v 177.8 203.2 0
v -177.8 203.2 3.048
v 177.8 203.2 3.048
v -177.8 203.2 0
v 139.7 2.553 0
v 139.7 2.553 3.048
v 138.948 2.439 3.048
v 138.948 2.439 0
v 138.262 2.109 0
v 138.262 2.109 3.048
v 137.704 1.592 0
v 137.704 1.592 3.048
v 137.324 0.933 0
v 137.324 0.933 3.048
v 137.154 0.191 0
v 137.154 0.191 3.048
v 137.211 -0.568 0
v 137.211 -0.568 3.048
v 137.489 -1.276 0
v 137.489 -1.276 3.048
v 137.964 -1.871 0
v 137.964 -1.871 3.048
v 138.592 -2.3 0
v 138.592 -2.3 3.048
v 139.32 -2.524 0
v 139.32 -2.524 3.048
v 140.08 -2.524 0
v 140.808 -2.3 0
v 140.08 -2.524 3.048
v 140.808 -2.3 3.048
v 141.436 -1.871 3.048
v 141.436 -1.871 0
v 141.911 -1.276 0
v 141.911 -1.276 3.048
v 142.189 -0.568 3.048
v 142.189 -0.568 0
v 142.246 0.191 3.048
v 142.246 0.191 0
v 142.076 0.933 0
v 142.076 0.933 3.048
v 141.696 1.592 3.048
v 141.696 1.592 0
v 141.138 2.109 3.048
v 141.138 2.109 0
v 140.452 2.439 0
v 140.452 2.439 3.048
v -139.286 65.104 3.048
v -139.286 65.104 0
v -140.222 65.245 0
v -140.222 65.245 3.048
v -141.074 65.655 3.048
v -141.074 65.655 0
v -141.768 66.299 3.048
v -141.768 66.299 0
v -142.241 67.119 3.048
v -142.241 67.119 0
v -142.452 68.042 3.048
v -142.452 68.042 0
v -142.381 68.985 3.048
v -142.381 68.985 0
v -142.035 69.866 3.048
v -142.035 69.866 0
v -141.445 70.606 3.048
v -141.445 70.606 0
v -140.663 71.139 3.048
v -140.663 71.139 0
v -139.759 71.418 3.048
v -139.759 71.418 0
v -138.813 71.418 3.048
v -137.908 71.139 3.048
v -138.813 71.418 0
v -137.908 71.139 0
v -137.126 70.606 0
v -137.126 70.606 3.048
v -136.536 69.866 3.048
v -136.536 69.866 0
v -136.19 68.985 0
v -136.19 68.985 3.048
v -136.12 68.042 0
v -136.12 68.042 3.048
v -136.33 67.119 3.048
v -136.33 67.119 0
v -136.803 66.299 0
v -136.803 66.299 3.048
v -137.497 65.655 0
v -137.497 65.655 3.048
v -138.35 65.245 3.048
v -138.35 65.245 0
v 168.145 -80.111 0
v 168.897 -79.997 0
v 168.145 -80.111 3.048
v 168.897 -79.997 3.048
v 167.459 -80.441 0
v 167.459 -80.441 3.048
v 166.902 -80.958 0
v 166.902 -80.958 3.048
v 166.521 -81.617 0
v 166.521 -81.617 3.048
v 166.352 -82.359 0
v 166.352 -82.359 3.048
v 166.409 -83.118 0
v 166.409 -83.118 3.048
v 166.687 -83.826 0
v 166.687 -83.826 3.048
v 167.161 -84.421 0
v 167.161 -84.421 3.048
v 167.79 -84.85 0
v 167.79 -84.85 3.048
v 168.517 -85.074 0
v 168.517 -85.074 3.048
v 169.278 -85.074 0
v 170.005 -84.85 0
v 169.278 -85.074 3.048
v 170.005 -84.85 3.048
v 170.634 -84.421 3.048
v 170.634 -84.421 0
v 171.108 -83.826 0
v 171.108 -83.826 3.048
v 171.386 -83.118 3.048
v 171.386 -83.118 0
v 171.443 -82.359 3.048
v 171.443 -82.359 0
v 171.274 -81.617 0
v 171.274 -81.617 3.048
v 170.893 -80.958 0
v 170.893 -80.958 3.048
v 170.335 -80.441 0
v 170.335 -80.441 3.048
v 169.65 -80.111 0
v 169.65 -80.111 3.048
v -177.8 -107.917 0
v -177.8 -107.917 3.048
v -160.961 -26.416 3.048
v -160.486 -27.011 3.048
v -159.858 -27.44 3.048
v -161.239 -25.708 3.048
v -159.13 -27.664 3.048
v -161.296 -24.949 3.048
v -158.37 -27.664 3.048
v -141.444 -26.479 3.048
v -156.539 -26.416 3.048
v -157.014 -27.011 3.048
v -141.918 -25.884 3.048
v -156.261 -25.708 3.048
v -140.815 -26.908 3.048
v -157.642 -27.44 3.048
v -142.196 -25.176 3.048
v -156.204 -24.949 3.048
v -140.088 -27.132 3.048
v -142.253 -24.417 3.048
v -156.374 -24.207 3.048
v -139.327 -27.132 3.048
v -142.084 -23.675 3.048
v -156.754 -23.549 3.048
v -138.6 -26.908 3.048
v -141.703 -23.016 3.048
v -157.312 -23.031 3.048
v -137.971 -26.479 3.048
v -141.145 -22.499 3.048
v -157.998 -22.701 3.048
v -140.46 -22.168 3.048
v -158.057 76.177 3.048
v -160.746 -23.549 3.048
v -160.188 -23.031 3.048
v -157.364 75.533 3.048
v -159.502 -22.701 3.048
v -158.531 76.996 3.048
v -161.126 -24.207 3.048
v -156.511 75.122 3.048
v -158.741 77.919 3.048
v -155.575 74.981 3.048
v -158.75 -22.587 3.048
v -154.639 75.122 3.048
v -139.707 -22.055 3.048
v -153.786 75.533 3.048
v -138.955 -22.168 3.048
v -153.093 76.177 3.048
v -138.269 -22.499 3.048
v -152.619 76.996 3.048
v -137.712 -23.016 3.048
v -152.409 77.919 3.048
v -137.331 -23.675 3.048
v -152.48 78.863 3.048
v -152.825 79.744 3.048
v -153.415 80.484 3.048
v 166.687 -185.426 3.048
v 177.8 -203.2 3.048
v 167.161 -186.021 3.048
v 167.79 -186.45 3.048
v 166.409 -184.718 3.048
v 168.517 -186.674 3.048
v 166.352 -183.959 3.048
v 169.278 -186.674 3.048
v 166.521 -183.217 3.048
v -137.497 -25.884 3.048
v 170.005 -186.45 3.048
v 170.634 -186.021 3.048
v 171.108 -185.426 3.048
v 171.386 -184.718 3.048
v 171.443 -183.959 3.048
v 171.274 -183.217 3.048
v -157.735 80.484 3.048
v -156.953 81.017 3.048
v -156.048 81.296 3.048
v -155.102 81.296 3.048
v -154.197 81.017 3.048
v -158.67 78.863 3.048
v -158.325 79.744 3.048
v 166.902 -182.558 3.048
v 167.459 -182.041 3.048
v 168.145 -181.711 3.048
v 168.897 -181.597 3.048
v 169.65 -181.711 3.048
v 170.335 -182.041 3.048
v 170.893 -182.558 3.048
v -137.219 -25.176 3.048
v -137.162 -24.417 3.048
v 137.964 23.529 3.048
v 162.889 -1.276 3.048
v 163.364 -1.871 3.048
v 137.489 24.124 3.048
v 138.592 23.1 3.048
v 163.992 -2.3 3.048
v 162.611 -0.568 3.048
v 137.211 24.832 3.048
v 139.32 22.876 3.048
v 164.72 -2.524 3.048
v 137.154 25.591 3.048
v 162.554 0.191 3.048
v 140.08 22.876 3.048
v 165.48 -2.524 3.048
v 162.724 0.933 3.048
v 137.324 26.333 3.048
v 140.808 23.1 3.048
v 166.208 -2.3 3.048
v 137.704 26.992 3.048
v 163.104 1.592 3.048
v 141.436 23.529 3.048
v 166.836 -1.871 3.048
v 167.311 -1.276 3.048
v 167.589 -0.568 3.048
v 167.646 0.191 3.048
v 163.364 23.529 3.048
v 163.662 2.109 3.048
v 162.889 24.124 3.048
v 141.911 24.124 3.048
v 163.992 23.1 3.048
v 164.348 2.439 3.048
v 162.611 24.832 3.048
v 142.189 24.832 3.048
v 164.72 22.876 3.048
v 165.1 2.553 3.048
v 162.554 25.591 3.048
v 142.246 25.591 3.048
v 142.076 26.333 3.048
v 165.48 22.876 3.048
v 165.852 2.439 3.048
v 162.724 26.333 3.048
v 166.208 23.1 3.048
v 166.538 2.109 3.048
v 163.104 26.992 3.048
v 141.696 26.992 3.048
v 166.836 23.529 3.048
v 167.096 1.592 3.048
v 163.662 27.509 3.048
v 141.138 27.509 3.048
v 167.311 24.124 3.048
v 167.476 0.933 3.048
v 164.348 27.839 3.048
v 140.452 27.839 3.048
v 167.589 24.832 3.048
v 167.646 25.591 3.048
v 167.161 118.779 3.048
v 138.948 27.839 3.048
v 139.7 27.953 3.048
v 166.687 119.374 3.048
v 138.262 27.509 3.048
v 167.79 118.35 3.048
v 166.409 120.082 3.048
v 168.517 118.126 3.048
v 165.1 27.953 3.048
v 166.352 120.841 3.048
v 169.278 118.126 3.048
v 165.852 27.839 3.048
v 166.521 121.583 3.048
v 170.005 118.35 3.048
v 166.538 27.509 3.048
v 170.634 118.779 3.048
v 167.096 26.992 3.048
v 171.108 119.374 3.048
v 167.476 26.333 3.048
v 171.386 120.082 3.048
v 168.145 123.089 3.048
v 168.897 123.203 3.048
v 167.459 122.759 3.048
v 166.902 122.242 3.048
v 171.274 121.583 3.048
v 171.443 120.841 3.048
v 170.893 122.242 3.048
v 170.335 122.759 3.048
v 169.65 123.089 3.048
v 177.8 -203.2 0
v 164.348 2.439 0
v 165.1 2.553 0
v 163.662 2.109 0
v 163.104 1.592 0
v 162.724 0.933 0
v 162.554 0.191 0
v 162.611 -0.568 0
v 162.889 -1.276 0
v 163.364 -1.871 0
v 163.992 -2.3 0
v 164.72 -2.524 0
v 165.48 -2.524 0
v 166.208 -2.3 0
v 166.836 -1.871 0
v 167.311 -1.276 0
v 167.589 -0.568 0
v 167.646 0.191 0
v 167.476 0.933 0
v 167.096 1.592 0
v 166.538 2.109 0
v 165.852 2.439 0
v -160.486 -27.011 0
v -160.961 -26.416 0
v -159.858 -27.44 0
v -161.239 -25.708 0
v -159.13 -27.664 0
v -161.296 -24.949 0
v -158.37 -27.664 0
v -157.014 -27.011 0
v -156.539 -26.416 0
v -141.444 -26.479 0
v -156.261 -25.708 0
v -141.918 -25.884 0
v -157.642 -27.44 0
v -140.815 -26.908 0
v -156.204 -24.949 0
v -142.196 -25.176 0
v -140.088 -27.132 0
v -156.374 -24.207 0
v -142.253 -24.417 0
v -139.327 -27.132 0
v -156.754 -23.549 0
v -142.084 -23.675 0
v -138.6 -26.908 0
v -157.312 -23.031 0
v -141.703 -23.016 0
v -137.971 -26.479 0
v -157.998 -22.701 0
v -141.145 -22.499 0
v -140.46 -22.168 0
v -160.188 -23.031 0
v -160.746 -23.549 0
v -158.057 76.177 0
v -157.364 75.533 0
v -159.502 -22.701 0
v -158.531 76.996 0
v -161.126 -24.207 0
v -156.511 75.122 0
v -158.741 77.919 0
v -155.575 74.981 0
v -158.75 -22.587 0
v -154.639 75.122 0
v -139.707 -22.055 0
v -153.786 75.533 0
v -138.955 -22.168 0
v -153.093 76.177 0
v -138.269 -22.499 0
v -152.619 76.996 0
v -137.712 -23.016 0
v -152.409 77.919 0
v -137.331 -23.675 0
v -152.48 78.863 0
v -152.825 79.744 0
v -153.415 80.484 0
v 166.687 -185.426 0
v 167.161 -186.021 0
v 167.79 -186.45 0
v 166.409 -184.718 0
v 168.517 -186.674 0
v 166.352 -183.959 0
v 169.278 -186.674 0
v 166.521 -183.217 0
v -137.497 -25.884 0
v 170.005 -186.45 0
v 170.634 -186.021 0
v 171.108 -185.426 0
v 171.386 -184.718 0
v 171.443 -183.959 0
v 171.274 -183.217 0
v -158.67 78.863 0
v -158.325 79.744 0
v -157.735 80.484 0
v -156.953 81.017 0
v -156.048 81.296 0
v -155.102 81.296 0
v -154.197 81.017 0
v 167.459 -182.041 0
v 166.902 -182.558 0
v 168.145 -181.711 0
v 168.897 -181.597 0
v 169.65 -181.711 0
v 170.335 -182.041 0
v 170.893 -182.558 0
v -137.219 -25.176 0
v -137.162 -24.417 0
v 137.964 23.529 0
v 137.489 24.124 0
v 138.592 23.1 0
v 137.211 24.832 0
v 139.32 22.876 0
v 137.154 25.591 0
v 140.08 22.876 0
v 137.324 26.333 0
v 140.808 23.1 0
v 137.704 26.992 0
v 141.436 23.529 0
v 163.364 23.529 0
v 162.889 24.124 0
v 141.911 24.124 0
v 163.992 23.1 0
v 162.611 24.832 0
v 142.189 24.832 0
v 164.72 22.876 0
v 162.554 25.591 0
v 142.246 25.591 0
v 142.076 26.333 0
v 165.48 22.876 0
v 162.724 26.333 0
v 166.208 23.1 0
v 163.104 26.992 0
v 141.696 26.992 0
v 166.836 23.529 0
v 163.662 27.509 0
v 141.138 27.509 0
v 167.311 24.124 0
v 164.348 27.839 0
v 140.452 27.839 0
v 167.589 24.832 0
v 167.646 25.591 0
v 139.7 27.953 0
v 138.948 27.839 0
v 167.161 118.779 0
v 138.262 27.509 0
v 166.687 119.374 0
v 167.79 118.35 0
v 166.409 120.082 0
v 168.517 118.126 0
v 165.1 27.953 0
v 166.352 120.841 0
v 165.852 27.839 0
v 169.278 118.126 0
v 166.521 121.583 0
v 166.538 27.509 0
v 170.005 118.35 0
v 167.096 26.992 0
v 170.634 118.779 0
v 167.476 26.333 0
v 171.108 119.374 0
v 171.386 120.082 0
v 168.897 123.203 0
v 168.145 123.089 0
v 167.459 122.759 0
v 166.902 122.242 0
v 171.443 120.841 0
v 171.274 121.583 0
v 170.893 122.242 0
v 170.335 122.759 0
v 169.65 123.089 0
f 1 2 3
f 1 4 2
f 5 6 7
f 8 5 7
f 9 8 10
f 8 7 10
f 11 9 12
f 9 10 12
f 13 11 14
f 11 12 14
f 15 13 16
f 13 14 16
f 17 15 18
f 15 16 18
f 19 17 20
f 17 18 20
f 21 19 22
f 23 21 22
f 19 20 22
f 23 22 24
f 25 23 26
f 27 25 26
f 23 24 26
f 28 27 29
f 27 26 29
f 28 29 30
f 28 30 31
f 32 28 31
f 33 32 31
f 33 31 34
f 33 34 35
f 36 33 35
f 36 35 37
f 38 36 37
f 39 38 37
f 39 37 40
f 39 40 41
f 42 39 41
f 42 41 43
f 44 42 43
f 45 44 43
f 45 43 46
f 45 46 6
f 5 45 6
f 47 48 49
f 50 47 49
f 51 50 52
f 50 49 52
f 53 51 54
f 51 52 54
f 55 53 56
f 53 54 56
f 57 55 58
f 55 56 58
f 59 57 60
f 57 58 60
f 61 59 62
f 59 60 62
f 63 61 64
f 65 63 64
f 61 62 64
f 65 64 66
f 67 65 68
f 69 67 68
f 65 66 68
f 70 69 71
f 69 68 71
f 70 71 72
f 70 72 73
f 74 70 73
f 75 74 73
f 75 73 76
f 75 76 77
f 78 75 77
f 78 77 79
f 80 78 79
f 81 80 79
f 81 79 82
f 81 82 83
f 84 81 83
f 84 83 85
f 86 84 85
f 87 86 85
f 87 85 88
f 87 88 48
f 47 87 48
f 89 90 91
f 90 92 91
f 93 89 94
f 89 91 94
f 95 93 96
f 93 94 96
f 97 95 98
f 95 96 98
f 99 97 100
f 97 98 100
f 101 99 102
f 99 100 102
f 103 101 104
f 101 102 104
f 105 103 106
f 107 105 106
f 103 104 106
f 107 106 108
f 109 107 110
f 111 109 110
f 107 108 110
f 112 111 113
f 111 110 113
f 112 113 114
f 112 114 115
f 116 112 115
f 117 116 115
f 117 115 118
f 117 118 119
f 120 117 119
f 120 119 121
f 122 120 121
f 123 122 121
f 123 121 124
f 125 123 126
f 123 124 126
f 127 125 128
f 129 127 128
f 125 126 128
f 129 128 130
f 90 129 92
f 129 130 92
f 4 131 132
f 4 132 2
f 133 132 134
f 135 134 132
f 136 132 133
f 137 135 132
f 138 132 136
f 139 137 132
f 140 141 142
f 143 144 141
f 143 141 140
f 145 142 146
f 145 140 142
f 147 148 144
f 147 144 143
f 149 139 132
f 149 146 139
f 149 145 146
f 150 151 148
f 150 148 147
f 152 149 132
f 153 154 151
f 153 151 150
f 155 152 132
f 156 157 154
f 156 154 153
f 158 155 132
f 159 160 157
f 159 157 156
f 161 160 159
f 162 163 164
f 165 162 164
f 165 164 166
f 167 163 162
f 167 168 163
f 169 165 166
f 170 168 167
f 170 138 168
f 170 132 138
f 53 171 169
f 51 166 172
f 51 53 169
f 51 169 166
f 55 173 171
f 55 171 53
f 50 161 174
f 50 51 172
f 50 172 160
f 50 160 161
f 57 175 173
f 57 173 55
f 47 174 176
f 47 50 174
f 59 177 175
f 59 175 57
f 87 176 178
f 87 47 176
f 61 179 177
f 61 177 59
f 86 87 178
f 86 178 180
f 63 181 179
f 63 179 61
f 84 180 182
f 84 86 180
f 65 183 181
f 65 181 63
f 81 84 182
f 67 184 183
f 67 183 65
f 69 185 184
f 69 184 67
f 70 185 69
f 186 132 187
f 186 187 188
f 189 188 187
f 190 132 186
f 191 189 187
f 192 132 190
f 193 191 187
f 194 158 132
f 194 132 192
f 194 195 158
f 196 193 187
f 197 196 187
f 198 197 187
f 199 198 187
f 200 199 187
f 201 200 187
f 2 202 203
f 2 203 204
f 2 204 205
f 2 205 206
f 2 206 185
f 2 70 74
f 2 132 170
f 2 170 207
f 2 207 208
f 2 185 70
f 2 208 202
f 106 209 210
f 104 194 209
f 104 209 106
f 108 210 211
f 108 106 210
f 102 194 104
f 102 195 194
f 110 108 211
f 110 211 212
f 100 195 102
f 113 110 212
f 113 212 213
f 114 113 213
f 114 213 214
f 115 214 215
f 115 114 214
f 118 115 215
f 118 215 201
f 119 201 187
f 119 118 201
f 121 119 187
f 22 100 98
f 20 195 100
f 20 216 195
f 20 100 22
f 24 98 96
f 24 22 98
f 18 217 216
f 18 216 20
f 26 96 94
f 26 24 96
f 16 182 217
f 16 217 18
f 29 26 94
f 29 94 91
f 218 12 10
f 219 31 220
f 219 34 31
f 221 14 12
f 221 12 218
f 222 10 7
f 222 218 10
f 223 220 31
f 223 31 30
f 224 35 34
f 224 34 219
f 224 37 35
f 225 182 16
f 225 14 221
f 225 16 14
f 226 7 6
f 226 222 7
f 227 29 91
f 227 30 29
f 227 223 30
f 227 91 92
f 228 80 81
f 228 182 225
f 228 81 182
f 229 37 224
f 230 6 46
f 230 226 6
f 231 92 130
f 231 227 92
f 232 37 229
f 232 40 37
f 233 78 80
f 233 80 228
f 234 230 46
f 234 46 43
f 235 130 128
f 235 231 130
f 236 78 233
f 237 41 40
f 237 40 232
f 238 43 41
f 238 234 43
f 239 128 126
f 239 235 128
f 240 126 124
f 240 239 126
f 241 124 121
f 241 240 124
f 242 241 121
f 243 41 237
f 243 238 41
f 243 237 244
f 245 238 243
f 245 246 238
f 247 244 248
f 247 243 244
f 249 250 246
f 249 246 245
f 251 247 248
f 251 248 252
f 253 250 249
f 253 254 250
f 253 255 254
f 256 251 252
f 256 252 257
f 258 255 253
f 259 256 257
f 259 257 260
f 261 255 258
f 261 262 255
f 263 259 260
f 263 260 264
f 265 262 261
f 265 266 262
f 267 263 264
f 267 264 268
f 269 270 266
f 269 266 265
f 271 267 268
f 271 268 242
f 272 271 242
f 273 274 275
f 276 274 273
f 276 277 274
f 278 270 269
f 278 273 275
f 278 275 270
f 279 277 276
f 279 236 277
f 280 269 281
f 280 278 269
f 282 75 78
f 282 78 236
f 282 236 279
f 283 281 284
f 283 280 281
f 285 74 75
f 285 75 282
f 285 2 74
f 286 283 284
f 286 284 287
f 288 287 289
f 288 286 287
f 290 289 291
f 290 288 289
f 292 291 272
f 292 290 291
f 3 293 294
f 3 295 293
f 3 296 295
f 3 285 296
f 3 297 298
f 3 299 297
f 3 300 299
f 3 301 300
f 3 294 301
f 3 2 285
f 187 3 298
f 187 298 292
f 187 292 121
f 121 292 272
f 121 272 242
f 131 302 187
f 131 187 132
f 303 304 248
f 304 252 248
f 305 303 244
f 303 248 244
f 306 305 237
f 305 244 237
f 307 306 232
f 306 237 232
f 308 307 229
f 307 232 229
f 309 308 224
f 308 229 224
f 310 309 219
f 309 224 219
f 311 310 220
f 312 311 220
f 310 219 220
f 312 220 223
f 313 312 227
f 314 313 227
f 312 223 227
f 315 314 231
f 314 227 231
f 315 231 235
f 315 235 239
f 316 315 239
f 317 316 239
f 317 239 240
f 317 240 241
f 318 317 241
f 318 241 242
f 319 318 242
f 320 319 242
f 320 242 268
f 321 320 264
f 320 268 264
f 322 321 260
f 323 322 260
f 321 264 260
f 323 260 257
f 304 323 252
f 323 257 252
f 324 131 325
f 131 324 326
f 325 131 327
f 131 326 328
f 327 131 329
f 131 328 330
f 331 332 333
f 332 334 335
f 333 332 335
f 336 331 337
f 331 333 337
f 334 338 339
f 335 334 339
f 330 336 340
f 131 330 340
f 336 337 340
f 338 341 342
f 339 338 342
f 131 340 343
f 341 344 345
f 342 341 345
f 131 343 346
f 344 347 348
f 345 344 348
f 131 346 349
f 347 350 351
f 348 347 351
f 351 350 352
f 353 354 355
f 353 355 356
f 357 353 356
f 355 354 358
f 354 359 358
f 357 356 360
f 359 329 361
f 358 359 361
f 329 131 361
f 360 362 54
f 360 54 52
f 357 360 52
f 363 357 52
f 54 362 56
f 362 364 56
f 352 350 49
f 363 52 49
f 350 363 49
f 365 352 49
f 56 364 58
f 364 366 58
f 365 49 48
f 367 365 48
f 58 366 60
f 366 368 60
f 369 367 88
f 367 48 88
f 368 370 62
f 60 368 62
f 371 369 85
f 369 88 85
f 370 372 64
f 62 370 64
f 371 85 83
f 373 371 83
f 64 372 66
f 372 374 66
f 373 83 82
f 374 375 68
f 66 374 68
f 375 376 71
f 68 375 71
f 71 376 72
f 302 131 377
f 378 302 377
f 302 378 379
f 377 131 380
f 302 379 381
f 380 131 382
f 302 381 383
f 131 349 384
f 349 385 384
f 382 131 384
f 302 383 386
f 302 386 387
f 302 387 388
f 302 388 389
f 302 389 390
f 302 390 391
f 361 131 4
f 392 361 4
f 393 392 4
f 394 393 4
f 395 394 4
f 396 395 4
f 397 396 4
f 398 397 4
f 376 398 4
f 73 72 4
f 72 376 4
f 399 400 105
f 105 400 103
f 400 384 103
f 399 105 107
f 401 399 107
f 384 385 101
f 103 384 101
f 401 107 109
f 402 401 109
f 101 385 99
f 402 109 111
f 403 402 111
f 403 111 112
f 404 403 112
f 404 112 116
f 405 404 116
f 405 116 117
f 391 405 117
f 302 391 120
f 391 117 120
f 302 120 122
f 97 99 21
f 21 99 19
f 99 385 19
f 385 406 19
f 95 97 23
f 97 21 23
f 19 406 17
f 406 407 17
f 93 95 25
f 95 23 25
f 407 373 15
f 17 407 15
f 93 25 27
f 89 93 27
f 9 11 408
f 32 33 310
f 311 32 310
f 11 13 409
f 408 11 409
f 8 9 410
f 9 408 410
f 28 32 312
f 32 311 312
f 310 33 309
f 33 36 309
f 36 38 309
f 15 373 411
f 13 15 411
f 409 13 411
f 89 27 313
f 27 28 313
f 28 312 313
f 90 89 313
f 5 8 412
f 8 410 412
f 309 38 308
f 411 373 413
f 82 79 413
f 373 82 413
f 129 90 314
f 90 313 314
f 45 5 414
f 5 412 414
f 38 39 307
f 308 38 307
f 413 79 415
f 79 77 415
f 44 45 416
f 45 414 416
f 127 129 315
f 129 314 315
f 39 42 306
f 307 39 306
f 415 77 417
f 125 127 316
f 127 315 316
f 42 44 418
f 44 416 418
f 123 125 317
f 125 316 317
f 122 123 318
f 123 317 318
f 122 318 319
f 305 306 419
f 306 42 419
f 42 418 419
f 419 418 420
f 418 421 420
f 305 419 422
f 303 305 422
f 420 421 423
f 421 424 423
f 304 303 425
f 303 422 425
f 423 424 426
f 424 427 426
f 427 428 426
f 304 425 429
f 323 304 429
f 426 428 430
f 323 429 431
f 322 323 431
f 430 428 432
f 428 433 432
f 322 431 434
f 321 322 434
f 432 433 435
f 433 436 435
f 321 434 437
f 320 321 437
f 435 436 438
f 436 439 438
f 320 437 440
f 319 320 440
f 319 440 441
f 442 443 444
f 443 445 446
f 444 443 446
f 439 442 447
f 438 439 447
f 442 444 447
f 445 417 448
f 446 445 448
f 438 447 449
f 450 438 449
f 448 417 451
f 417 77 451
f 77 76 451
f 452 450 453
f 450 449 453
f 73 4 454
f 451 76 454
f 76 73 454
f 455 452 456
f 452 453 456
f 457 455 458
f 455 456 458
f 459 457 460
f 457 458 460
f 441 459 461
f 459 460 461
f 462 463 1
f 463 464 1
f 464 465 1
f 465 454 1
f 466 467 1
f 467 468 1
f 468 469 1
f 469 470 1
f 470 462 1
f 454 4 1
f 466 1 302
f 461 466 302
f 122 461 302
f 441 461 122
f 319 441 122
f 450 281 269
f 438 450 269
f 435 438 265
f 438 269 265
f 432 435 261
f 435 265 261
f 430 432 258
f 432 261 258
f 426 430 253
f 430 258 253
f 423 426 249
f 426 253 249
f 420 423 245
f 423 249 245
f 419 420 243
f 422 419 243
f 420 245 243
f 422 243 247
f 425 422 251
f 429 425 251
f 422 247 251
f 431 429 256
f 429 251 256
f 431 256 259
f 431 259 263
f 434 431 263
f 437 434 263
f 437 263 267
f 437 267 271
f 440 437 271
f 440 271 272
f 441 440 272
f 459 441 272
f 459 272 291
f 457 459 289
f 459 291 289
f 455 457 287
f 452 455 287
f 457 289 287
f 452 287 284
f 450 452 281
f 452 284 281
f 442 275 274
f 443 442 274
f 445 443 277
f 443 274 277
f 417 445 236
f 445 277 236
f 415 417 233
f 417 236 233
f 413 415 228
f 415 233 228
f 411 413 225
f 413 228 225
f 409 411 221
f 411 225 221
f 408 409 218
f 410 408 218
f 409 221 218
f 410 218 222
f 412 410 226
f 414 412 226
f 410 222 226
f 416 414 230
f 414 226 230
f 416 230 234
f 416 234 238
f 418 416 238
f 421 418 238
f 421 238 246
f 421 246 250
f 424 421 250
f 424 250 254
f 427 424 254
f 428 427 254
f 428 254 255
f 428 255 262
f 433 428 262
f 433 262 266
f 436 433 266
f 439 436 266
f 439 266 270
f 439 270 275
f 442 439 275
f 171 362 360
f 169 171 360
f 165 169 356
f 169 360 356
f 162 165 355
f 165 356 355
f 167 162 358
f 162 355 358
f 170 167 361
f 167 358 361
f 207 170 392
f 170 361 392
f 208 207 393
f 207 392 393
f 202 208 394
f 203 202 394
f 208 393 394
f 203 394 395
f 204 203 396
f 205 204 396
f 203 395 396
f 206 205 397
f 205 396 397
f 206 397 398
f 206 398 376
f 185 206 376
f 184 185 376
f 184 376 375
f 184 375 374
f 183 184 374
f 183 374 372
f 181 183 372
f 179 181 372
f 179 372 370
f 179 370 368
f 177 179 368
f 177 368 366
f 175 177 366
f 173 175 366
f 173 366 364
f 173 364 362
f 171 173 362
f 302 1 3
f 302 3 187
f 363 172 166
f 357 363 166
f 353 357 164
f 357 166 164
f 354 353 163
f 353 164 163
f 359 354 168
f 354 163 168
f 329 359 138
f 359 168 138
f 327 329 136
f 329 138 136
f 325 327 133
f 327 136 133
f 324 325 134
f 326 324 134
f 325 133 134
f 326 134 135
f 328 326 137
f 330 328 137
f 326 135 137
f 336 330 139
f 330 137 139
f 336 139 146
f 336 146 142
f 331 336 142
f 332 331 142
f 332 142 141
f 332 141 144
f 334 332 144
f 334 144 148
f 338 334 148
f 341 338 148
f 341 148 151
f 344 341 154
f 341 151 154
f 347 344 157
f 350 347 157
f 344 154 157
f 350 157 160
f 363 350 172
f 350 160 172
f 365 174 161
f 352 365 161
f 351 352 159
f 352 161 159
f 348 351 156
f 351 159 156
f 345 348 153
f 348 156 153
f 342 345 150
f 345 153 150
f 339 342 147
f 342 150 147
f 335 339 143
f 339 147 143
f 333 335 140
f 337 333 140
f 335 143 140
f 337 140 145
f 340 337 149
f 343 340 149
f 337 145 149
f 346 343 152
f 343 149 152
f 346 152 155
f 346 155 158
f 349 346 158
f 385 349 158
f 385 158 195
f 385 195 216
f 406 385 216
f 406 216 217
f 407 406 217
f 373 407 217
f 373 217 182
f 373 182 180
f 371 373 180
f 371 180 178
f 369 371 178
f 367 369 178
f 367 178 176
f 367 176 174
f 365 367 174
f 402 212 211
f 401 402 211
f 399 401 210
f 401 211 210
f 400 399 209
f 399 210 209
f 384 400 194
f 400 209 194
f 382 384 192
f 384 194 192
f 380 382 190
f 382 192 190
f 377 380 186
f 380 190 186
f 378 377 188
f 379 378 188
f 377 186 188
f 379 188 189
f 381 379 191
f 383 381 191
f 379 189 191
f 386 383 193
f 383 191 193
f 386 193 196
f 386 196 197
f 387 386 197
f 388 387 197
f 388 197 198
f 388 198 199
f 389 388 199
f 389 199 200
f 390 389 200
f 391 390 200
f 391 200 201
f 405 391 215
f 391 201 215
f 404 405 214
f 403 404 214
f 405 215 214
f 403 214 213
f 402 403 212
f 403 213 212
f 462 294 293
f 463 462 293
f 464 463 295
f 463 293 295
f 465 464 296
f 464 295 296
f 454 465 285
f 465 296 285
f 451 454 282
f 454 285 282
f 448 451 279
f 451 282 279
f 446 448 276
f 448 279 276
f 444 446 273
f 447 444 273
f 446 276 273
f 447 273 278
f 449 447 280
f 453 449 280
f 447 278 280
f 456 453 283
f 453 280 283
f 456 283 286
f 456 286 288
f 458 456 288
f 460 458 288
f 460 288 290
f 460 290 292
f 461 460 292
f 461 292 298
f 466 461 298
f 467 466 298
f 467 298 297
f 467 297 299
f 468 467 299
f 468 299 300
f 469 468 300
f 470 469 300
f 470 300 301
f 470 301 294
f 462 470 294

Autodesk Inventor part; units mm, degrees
ref_plane "YZ Plane" through (0, 0, 0) normal (1, 0, 0) x (0, 1, 0)
ref_plane "XZ Plane" through (0, 0, 0) normal (0, 1, 0) x (-1, 0, 0)
ref_plane "XY Plane" through (0, 0, 0) normal (0, 0, 1) x (1, 0, 0)
sketch "Sketch1" plane through (0, 0, 0) normal (0, 0, 1) x (1, 0, 0)
  line L0 (-177.8, 203.2) -> (177.8, 203.2)
  line L1 (177.8, 203.2) -> (177.8, -203.2)
  line L2 (177.8, -203.2) -> (-177.8, -203.2)
  line L3 (-177.8, -203.2) -> (-177.8, 203.2)
  line L4 (-177.8, 203.2) -> (177.8, -203.2) construction
  line L5 (177.8, 203.2) -> (-177.8, -203.2) construction
  point P0 (0, 0)
  dimension "d0" = 355.6
  dimension "d1" = 406.4
extrude "Plate1" add sketch "Sketch1" along normal blind 3.048
sketch "Sketch2" plane through (0, 0, 0) normal (0, 0, -1) x (-1, 0, 0)
  line L0 (177.8, -203.2) -> (-177.8, -203.2) construction
  line L1 (177.8, 203.2) -> (177.8, -203.2) construction
  line L2 (-177.8, 203.2) -> (177.8, 203.2) construction
  line L3 (-177.8, -203.2) -> (-177.8, 203.2) construction
  line L4 (-177.8, -203.2) -> (177.8, -107.9173)
  line L5 (-177.8, -203.2) -> (190.3442, -203.2) construction
  line L6 (177.8, 203.2) -> (177.8, -203.2) construction
  line L7 (177.8, -107.9173) -> (177.8, -203.2)
  line L8 (177.8, -203.2) -> (-177.8, -203.2)
  point P0 (0, 0)
  dimension "d3" = 15
extrude "Cut1" cut sketch "Sketch2" against normal blind 3.048
sketch "Sketch3" plane through (0, 0, 0) normal (0, 0, -1) x (-1, 0, 0)
  line L0 (-177.8, -203.2) -> (177.8, -107.9173) construction
  line L1 (177.8, 203.2) -> (177.8, -107.9173) construction
  line L2 (-177.8, 203.2) -> (177.8, 203.2) construction
  line L3 (-177.8, -203.2) -> (-177.8, 203.2) construction
  line L4 (-177.8, 0) -> (-165.1, 0) construction
  point P0 (0, 0)
  point P1 (-139.7, 0)
  point P2 (-165.1, 25.4)
  point P3 (-139.7, 25.4)
  dimension "d6" = 12.7
  dimension "d9" = 25.4
  dimension "d12" = 25.4
hole "Hole1" at (165.1, 0, 0) at (139.7, 0, 0) at (165.1, 25.4, 0) at (139.7, 25.4, 0) direction (0, 0, 1) diameter 5.1054 end through all clearance for "Flat Head Machine Screw (82)" size "#10" standard "Ansi Unified Screw Threads"
sketch "Sketch4" plane through (0, 0, 0) normal (0, 0, -1) x (-1, 0, 0)
  line L0 (-168.8973, -203.2) -> (-168.8973, 203.2) construction
  line L1 (-177.8, -203.2) -> (-177.8, 203.2) projected
  point P0 (0, 0)
  point P1 (-168.8973, -184.15)
  point P2 (-168.8973, -82.55)
  point P3 (-168.8973, 120.65)
  dimension "d22" = 8.9027
  dimension "d23" = 101.6
  dimension "d24" = 19.05
  dimension "d25" = 203.2
hole "Hole2" at (168.8973, -184.15, 0) at (168.8973, -82.55, 0) at (168.8973, 120.65, 0) direction (0, 0, 1) diameter 5.1054 end through all
sketch "Sketch5" plane through (0, 0, 0) normal (0, 0, -1) x (-1, 0, 0)
  circle A0 centre (158.75, -25.1401) radius 2.0193 projected
  circle A1 centre (139.7074, -24.6077) radius 2.0193 projected
  point P0 (0, 0)
hole "Hole3" at (-158.75, -25.1401, 0) at (-139.7074, -24.6077, 0) direction (0, 0, 1) diameter 5.1054 depth 3.048 tip angle 118
sketch "Sketch6" plane through (0, 0, 3.048) normal (0, 0, 1) x (1, 0, 0)
  line L0 (-155.0242, 77.8222) -> (-152.7105, 76.4193)
  line L1 (-177.8, -107.9173) -> (-177.8, 203.2) projected
  point P0 (0, 0)
  point P1 (-155.575, 78.1562)
  point P2 (-139.2858, 68.2788)
  dimension "d40" = 19.05
  dimension "d41" = 22.225
hole "Hole4" at (-155.575, 78.1562, 3.048) at (-139.2858, 68.2788, 3.048) direction (0, 0, -1) diameter 6.35 depth 3.048 tip angle 118
equation "\"d4\" = Thickness"
equation "\"d20\" = Thickness"
equation "\"d31\" = Thickness"
equation "\"d38\" = Thickness"
equation "\"d47\" = Thickness"
equation "\"d2\" = Thickness"
equation "\"BendRadius\" = Thickness"
equation "\"BendReliefWidth\" = Thickness"
equation "\"BendReliefDepth\" = 0.5 * Thickness"
equation "\"CornerReliefSize\" = 4 * Thickness"
equation "\"MinimumRemnant\" = 2 * Thickness"
equation "\"TransitionRadius\" = BendRadius"
equation "\"JacobiRadiusSize\" = BendRadius"
equation "\"GapSize\" = Thickness"
equation "\"Thickness\" = 3.048"
properties part number "hopper_side_l" material "Polycarbonate, Clear"
